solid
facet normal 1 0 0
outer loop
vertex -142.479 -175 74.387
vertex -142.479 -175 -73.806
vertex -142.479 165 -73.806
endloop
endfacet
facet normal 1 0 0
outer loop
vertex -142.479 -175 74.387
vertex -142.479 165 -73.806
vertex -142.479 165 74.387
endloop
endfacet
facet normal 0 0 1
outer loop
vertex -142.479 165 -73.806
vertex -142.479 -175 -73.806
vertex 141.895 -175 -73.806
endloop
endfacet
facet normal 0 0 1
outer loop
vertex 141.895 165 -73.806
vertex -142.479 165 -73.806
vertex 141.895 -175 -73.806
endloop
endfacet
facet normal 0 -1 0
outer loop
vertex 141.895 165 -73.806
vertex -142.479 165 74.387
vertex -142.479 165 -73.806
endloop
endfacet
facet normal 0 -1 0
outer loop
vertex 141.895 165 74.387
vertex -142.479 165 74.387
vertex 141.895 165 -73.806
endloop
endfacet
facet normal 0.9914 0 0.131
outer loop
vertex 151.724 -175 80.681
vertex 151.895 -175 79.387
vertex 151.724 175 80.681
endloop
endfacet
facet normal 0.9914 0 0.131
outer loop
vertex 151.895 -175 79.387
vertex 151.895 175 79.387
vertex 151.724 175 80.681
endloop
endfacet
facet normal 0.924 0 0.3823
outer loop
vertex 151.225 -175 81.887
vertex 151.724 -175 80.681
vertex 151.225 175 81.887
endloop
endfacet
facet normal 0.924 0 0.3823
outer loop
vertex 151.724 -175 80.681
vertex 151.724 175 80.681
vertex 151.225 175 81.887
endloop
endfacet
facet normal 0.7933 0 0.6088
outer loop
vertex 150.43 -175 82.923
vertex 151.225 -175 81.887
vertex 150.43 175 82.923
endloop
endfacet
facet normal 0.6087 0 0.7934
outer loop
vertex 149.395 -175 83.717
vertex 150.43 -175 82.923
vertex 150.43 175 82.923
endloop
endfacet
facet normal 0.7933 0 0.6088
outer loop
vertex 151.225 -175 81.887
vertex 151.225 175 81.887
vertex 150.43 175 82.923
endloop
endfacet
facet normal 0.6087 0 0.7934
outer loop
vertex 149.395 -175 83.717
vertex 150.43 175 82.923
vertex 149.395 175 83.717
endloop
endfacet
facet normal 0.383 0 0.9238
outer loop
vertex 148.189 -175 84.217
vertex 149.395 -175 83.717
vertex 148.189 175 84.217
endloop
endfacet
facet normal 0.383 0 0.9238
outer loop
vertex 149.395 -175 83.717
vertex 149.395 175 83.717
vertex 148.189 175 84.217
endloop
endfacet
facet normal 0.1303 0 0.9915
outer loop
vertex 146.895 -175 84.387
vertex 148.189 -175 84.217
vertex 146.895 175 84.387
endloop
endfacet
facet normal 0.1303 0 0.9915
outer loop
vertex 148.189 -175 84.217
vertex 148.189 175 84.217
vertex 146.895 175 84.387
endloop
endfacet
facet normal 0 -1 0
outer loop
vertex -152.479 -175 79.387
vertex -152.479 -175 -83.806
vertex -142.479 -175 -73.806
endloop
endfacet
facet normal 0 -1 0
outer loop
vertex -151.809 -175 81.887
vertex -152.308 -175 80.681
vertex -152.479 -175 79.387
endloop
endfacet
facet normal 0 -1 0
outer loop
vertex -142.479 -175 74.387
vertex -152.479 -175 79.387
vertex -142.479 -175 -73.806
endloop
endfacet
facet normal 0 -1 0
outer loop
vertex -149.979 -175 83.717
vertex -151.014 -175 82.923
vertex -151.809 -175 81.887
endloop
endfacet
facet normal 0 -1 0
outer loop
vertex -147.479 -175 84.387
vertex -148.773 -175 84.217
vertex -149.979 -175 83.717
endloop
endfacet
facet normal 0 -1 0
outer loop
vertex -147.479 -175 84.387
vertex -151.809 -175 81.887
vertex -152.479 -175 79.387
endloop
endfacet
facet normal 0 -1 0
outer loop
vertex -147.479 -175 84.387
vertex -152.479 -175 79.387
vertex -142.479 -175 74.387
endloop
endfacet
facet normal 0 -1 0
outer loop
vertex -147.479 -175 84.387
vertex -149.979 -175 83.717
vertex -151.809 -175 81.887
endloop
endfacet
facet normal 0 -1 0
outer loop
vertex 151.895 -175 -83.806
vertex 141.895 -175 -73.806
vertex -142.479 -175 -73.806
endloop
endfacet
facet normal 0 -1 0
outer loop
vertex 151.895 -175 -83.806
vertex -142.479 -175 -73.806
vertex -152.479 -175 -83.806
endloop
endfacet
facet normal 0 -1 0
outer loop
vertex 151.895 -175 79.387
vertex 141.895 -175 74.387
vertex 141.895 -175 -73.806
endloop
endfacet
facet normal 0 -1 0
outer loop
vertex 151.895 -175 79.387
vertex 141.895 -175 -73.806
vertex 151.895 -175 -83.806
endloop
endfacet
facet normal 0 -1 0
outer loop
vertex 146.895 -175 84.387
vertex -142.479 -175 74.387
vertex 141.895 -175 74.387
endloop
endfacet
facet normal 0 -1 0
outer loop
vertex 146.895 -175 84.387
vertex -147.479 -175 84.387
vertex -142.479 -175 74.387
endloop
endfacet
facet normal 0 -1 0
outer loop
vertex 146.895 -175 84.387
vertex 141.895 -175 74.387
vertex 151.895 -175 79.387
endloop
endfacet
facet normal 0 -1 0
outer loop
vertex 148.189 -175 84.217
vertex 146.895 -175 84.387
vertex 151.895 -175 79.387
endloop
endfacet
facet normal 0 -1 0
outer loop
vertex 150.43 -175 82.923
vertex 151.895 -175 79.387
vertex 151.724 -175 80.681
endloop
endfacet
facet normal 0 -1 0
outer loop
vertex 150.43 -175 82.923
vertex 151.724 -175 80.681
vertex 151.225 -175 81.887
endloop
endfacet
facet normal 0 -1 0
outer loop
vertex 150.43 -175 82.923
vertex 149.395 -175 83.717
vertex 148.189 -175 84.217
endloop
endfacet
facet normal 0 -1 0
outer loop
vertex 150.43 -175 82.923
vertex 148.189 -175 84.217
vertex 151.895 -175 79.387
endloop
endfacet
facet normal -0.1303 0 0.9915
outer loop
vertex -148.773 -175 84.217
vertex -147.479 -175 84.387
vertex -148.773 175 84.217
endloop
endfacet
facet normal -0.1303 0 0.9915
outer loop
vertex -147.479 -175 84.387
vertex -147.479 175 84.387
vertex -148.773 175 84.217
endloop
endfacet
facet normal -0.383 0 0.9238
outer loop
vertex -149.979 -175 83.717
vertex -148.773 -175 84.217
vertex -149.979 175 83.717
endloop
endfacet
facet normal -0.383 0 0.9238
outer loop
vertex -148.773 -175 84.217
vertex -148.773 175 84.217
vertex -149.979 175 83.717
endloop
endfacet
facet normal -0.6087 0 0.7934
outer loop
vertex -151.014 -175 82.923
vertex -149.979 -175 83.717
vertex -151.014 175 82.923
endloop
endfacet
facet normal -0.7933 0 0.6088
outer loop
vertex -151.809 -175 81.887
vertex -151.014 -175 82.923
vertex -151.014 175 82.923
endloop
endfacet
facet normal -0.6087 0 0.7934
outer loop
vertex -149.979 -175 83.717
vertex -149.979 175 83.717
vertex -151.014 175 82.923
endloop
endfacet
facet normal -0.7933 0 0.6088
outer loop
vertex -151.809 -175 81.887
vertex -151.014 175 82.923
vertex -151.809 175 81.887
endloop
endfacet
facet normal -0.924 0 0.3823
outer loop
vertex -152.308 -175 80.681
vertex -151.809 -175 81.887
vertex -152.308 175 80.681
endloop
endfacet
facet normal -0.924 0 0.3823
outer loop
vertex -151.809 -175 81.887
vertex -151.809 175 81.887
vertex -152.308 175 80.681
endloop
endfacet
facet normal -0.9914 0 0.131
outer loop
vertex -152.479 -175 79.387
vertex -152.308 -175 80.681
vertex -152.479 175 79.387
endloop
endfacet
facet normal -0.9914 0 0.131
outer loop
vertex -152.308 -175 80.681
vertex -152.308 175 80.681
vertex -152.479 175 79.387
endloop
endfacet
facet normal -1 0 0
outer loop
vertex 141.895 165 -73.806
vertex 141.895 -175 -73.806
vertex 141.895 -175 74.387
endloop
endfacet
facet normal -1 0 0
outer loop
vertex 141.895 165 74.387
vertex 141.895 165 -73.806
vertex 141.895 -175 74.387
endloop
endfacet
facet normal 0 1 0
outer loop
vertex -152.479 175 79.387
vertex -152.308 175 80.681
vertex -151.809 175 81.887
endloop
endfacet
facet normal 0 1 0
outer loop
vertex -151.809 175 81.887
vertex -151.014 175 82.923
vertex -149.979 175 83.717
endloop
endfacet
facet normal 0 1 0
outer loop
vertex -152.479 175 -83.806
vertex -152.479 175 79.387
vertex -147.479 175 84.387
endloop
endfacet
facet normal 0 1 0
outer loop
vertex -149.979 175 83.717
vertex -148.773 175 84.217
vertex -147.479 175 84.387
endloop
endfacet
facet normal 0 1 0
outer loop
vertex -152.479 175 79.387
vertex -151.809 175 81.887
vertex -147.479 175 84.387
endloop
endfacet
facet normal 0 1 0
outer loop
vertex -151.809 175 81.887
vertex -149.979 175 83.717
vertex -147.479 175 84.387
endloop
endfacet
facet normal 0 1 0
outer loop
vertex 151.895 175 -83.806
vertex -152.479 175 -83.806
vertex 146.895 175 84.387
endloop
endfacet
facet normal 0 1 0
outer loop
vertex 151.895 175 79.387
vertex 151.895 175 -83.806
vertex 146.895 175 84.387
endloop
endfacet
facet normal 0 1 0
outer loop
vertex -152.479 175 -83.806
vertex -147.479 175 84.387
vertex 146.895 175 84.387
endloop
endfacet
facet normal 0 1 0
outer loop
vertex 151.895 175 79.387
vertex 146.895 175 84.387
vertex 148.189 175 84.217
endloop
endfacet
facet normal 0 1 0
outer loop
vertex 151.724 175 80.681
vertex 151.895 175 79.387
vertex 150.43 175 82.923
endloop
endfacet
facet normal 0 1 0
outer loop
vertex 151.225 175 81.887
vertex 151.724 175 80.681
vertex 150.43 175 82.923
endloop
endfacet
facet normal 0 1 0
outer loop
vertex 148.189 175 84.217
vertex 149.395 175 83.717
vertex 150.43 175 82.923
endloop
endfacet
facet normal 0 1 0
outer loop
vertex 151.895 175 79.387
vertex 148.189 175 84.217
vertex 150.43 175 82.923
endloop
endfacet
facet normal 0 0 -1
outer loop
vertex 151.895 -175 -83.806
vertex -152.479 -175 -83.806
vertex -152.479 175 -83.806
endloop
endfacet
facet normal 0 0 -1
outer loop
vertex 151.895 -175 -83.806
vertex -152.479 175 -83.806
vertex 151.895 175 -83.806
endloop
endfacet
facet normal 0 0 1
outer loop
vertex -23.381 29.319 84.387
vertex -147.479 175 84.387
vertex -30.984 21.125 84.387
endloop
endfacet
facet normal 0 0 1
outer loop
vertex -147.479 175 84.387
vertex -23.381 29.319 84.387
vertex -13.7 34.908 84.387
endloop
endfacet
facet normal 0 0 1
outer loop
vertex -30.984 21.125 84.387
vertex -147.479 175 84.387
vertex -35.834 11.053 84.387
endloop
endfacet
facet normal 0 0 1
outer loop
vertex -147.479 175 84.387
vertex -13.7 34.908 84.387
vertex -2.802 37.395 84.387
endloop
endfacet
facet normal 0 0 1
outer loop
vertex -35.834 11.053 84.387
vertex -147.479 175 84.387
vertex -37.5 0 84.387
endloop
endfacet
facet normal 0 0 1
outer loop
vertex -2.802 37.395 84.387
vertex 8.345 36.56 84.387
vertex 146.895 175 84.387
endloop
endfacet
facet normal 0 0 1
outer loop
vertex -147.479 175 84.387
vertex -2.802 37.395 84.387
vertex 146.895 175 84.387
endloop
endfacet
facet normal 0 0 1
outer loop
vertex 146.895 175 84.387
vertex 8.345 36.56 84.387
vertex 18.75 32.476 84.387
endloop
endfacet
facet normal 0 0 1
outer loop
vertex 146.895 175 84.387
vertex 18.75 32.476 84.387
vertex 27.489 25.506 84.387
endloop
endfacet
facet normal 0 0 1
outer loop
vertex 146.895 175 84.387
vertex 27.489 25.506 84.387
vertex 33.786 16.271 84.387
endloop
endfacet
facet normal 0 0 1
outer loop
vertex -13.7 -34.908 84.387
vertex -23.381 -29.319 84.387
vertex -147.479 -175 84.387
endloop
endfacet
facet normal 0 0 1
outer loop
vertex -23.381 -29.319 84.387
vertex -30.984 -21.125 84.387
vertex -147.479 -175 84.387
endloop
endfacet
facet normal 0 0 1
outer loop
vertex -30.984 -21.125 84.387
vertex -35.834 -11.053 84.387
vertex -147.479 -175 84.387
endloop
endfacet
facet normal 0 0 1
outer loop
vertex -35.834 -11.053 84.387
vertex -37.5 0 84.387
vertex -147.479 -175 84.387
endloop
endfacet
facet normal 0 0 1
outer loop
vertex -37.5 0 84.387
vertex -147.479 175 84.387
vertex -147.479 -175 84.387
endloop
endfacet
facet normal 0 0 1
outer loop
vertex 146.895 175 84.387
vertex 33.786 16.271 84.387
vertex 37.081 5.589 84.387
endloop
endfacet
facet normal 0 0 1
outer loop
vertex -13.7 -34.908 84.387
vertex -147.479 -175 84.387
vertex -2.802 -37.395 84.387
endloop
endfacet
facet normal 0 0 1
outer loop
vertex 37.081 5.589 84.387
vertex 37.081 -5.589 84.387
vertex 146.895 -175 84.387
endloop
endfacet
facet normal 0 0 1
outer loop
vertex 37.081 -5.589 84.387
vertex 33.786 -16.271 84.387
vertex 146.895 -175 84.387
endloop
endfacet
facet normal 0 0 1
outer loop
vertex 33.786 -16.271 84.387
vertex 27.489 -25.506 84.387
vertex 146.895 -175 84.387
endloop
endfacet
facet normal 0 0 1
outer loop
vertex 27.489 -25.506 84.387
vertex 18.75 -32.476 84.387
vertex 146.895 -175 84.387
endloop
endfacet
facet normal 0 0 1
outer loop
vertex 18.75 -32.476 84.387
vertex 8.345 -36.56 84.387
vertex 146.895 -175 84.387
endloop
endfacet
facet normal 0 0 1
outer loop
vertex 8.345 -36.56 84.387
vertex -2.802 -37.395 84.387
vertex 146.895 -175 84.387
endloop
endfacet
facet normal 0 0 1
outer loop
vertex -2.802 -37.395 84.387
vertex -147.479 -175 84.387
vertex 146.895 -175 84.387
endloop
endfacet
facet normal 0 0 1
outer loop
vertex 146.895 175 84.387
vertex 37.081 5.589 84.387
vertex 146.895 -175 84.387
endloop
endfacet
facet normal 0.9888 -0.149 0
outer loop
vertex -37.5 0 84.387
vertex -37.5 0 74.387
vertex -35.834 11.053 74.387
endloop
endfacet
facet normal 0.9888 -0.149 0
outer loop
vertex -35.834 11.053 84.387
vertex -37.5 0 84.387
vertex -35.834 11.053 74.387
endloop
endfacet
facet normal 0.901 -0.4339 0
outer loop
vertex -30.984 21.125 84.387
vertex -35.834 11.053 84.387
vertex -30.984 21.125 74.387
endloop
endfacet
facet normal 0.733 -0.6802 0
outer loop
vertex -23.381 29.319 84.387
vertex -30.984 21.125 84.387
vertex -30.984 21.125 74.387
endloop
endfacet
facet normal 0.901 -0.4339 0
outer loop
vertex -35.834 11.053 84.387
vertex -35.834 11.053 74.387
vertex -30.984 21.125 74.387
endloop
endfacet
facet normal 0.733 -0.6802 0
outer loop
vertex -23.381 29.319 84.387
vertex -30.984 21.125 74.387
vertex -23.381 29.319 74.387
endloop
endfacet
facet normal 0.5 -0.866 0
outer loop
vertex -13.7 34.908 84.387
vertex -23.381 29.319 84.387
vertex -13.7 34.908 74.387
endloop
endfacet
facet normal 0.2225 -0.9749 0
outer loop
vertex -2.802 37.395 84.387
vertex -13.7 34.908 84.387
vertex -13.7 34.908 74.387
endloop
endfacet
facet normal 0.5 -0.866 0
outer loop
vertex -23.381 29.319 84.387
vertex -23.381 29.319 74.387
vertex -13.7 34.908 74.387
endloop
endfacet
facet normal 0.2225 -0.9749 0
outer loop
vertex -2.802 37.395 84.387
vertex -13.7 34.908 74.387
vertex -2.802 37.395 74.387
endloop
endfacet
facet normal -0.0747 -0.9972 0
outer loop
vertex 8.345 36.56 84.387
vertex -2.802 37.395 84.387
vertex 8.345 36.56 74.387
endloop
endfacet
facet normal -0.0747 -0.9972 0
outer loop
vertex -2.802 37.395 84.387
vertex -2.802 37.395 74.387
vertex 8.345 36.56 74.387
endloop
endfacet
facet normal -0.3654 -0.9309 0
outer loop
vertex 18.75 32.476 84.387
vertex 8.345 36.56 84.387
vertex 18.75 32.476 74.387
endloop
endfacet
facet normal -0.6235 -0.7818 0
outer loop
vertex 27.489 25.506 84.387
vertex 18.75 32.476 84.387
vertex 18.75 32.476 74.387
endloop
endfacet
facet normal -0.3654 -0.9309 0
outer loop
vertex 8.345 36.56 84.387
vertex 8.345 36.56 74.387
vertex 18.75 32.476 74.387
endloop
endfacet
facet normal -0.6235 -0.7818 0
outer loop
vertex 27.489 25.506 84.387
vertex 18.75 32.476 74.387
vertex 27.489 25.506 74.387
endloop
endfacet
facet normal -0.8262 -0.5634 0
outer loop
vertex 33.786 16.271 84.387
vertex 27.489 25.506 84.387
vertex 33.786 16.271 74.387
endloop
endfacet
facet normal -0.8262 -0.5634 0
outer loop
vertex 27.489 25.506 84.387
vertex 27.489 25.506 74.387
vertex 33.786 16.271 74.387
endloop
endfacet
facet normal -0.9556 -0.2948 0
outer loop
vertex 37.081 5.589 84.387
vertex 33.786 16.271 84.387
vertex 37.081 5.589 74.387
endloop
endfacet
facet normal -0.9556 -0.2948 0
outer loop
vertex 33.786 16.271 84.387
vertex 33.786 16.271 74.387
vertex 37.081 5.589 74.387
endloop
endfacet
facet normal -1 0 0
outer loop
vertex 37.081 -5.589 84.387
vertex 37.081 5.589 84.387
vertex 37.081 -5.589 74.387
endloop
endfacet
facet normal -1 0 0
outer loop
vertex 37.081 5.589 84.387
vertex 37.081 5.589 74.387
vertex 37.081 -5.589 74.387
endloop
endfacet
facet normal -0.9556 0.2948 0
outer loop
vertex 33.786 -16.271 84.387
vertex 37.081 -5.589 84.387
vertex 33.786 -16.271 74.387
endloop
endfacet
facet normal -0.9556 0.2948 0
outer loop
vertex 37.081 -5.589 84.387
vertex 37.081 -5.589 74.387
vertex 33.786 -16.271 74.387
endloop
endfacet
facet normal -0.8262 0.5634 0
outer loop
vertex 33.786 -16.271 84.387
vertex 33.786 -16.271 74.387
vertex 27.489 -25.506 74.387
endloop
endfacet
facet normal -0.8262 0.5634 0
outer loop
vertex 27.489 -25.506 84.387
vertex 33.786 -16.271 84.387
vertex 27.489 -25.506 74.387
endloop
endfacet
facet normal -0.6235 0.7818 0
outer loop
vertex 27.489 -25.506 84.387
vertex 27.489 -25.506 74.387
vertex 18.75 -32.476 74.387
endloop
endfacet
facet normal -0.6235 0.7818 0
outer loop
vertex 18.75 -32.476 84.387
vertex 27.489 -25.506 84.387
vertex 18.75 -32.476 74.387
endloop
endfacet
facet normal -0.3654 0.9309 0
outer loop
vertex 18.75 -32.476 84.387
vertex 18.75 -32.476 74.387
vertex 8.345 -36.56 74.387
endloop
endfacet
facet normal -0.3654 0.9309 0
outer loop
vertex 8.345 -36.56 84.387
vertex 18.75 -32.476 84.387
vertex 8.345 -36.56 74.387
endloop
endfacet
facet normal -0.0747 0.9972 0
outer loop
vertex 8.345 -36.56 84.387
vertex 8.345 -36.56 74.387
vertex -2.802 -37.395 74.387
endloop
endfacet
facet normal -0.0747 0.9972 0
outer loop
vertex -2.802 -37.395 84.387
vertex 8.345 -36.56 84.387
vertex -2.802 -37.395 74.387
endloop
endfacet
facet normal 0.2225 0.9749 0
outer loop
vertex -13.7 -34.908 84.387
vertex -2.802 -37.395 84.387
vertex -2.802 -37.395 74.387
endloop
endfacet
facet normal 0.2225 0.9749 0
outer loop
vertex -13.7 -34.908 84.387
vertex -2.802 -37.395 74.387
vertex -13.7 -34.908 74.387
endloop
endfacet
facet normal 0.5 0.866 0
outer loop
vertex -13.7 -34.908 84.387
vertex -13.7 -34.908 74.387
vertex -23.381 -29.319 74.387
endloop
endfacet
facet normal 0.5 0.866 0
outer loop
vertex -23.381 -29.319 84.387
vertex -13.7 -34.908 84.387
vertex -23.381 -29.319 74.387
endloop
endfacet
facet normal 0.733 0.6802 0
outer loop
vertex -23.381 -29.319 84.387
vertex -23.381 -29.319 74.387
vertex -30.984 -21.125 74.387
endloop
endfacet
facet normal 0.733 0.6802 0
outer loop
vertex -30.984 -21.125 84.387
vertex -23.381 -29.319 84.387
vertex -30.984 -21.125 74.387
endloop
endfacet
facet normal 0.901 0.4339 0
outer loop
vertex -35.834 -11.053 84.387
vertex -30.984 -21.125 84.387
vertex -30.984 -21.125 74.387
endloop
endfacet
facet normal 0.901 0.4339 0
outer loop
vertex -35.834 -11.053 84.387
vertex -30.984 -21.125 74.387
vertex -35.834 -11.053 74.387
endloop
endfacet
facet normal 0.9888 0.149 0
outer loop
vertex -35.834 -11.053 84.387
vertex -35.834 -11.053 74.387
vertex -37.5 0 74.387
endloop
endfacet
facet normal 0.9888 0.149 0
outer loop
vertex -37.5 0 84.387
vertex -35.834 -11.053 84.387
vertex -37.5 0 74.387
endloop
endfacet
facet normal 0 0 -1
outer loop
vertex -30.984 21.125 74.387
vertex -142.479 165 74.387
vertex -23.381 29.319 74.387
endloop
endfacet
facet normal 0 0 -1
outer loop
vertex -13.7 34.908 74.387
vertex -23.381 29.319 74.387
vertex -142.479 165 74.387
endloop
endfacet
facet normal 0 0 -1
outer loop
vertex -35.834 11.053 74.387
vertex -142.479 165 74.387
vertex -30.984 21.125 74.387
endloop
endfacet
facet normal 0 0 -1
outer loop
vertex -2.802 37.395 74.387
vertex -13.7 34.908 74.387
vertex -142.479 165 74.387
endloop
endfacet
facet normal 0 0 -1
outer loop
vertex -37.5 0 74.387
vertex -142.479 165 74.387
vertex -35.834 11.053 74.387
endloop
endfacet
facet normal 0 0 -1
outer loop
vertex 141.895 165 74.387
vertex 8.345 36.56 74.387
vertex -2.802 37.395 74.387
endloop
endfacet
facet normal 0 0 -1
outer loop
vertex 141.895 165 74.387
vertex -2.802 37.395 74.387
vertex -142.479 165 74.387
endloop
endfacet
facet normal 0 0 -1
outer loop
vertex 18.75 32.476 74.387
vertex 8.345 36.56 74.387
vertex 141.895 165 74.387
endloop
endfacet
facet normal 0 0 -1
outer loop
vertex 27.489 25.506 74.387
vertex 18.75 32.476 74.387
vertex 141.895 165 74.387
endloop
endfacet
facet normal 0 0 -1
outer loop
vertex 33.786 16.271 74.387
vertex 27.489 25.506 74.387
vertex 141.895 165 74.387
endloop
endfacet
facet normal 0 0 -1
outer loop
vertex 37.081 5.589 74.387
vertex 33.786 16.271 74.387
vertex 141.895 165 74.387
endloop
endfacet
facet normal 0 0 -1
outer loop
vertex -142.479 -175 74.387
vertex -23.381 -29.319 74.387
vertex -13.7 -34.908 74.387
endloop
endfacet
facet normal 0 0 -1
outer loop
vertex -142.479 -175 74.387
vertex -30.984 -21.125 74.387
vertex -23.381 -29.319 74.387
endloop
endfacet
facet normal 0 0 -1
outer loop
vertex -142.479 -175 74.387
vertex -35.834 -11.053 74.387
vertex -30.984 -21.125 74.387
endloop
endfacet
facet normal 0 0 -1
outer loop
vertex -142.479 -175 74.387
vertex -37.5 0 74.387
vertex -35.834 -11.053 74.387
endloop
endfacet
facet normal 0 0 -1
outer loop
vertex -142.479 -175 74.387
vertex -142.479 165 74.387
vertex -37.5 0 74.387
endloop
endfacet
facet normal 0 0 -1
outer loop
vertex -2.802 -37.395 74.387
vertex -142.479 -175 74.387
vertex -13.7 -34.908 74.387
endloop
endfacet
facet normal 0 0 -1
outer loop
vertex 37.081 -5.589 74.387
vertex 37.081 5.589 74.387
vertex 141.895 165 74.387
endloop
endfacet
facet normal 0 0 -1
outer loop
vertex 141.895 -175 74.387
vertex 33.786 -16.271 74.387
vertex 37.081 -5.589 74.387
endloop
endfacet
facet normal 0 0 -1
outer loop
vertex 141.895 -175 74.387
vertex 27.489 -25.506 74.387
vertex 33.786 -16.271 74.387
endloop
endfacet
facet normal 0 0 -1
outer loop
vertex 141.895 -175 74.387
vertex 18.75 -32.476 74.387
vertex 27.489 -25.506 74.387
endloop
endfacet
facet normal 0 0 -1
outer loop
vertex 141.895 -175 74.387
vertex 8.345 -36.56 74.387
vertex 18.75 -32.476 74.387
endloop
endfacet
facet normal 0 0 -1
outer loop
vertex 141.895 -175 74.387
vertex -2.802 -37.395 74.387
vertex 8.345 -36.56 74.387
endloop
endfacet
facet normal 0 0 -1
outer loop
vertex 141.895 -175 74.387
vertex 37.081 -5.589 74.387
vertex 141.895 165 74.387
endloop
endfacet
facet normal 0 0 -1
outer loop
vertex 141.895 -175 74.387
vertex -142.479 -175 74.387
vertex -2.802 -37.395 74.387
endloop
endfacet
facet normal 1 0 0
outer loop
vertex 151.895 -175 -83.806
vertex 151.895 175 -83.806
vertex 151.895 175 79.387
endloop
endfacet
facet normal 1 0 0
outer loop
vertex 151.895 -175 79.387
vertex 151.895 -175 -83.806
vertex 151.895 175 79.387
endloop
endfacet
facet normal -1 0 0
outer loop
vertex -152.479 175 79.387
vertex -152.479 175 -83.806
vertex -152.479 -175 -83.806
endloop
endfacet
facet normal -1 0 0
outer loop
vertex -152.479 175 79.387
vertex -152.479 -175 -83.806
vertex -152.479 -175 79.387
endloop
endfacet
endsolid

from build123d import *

# Parameters (mm, degrees)
F0_W     = 304.373444
F0_H     = 168.19302
F1_DEPTH = 175
F2_T     = -10
F4_D     = 75
F4_DEPTH = 12
F5_R     = 5


with BuildPart() as f1:
    # F0 (on Front) → F1 (new body, symmetric)
    with BuildSketch(Plane.XZ):
        with Locations((-0.291869, 0.29074)):
            Rectangle(F0_W, F0_H)
    extrude(amount=F1_DEPTH, both=True)

    # F2
    f2_openings = [f1.faces().sort_by_distance(p)[0] for p in [
        (-0.291869, -175, 0.29074),
    ]]
    offset(amount=F2_T, openings=f2_openings)

    # F4
    with Locations(Plane.XY.offset(84.38725)):
        with Locations((0, 0)):
            Hole(F4_D / 2, depth=F4_DEPTH)

    # F5
    f5_edges = [f1.edges().sort_by_distance(p)[0] for p in [
        (-152.478591, 0, 84.38725),
        (151.894853, 0, 84.38725),
    ]]
    fillet(f5_edges, radius=F5_R)


solid = f1.part
